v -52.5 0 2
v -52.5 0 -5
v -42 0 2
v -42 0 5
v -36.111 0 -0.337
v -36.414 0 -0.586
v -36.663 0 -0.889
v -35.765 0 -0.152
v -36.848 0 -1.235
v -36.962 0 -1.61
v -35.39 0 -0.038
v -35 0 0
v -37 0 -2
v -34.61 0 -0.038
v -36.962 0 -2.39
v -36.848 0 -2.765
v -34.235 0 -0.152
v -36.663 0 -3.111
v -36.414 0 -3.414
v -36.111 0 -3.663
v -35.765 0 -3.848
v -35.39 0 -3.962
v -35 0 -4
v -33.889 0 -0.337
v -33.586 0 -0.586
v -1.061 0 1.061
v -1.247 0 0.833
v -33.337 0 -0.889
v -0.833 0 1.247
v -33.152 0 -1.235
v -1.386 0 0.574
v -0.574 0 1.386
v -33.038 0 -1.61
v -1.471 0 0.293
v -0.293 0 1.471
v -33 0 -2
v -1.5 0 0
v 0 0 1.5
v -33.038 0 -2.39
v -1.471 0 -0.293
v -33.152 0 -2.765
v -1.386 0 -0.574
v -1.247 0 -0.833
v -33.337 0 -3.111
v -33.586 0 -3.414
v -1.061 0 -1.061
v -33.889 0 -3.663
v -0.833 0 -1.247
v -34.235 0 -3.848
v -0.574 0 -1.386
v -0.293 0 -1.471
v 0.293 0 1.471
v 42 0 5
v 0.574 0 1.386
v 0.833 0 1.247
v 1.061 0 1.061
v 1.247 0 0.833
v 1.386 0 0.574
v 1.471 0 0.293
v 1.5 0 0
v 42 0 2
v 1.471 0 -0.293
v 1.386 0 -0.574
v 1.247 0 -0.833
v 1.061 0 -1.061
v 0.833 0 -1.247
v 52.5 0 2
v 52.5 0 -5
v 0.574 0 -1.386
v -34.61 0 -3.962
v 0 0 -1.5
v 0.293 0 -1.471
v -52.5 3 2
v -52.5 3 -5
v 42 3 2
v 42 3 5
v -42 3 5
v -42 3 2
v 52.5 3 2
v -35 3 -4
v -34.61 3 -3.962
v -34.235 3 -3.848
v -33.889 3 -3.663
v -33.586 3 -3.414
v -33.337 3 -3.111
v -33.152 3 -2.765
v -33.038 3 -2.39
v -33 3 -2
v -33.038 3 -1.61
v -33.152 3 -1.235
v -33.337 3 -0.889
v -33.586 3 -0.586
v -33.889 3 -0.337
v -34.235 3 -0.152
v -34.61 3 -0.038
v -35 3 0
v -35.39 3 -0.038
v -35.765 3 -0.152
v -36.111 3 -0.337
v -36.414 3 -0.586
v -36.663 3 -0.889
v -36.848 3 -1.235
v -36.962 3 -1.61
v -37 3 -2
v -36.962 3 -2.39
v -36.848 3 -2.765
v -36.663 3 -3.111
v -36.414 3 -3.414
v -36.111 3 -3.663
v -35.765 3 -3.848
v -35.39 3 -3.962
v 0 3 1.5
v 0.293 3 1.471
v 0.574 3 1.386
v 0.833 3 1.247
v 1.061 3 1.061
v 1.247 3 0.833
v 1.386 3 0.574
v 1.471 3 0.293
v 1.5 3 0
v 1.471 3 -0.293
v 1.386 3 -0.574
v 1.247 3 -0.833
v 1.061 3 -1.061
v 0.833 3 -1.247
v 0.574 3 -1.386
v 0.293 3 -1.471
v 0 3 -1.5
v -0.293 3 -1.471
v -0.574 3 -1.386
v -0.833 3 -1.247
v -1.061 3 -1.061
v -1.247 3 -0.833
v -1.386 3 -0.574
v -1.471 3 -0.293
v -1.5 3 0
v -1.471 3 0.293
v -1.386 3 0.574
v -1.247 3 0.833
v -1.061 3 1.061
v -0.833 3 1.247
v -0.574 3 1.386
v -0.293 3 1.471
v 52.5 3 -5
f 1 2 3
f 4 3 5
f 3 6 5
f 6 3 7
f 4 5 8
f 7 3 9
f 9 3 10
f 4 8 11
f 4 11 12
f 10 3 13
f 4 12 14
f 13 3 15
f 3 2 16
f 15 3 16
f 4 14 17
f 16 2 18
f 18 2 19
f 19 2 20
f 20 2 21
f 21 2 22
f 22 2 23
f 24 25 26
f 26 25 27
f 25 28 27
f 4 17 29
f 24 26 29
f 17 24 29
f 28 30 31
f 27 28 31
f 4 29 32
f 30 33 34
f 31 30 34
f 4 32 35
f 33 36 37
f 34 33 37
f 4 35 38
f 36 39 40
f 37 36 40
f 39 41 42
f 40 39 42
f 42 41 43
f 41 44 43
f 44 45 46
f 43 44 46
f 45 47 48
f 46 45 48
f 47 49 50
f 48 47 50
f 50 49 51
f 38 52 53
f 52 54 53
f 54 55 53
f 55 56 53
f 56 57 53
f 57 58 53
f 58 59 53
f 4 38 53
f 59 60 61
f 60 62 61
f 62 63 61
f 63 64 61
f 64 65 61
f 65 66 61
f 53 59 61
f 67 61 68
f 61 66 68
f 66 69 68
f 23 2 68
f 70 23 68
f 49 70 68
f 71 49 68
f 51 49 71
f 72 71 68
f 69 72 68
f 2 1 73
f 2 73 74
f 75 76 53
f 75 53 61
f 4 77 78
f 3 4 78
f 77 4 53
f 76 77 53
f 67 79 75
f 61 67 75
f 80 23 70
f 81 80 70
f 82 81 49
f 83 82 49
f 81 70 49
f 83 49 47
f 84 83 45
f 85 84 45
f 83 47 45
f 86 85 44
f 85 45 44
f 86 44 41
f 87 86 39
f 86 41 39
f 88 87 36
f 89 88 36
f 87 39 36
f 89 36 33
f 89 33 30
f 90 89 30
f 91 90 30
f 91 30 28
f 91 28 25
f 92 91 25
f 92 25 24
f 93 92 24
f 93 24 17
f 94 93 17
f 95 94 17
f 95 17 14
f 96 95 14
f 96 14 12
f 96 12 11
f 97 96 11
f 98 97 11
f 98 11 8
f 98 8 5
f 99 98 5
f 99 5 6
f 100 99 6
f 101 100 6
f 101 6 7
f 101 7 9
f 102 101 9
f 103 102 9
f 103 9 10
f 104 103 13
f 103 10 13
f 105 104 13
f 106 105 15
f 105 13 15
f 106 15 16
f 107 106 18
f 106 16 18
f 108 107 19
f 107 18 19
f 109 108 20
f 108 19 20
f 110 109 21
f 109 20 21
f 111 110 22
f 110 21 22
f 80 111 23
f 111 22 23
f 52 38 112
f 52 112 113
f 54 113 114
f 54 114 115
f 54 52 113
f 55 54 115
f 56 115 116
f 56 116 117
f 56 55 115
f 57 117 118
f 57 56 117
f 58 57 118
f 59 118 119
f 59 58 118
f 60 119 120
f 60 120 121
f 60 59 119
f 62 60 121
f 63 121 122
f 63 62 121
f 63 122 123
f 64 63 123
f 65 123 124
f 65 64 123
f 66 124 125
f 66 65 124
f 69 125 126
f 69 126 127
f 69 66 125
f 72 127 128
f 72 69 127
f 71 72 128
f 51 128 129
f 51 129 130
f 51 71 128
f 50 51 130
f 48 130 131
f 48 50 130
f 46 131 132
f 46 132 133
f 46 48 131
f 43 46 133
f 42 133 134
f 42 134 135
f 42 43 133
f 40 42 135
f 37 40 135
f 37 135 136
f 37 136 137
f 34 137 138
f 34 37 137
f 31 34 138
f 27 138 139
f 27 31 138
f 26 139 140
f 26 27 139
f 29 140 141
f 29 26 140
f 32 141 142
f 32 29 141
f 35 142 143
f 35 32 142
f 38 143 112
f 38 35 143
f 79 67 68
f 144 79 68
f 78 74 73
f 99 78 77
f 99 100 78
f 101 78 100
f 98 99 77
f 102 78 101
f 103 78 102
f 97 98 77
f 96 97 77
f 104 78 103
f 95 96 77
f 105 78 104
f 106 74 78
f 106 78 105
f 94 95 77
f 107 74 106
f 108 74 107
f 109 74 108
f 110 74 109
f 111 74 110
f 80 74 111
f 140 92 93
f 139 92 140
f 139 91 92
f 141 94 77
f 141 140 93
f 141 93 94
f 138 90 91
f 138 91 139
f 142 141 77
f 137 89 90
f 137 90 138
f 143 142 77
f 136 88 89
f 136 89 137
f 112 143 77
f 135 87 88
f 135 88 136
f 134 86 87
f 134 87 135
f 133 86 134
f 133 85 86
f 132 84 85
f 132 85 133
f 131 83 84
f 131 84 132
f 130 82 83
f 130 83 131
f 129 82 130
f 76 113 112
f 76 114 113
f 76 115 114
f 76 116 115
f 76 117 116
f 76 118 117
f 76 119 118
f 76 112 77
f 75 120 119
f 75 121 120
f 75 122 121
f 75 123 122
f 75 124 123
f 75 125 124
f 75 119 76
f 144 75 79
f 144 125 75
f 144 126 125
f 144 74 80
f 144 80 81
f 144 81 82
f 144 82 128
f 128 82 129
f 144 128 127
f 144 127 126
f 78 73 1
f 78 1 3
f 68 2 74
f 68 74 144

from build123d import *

# Parameters (mm, degrees)
SKETCH1_W           = 105
SKETCH1_H           = 10
SKETCH1_R           = 1.5
BOSS_EXTRUDE1_DEPTH = 3
SKETCH2_W           = 10.5
SKETCH2_H           = 3
CUT_EXTRUDE1_DEPTH  = 53.82281704
SKETCH3_R           = 2
CUT_EXTRUDE3_DEPTH  = 10


with BuildPart() as part:
    # Sketch1 → Boss-Extrude1 (new body)
    with BuildSketch(Plane(origin=(0, 0, 0), x_dir=(1, 0, 0), z_dir=(0, 1, 0))):
        Rectangle(SKETCH1_W, SKETCH1_H)
        with Locations(Location((0, 0, 0), (0, 0, 270))):
            Circle(SKETCH1_R, mode=Mode.SUBTRACT)
    extrude(amount=BOSS_EXTRUDE1_DEPTH)

    # Sketch2 → Cut-Extrude1 (cut, through all)
    with BuildSketch(Plane(origin=(0, 3, 0), x_dir=(1, 0, 0), z_dir=(0, 1, 0))):
        with Locations((-47.25, -3.5)):
            Rectangle(SKETCH2_W, SKETCH2_H)
    cut_extrude1 = extrude(amount=-CUT_EXTRUDE1_DEPTH, mode=Mode.SUBTRACT)

    # Mirror2: Cut-Extrude1 across plane
    add(cut_extrude1.mirror(Plane(origin=(0, 0, 0), x_dir=(0, 0, 1), z_dir=(1, 0, 0))), mode=Mode.SUBTRACT)

    # Sketch3 → Cut-Extrude3 (cut)
    with BuildSketch(Plane.XZ):
        with Locations(Location((-35, -2, 0), (0, 0, 270))):
            Circle(SKETCH3_R)
    extrude(amount=-CUT_EXTRUDE3_DEPTH, mode=Mode.SUBTRACT)


solid = part.part
